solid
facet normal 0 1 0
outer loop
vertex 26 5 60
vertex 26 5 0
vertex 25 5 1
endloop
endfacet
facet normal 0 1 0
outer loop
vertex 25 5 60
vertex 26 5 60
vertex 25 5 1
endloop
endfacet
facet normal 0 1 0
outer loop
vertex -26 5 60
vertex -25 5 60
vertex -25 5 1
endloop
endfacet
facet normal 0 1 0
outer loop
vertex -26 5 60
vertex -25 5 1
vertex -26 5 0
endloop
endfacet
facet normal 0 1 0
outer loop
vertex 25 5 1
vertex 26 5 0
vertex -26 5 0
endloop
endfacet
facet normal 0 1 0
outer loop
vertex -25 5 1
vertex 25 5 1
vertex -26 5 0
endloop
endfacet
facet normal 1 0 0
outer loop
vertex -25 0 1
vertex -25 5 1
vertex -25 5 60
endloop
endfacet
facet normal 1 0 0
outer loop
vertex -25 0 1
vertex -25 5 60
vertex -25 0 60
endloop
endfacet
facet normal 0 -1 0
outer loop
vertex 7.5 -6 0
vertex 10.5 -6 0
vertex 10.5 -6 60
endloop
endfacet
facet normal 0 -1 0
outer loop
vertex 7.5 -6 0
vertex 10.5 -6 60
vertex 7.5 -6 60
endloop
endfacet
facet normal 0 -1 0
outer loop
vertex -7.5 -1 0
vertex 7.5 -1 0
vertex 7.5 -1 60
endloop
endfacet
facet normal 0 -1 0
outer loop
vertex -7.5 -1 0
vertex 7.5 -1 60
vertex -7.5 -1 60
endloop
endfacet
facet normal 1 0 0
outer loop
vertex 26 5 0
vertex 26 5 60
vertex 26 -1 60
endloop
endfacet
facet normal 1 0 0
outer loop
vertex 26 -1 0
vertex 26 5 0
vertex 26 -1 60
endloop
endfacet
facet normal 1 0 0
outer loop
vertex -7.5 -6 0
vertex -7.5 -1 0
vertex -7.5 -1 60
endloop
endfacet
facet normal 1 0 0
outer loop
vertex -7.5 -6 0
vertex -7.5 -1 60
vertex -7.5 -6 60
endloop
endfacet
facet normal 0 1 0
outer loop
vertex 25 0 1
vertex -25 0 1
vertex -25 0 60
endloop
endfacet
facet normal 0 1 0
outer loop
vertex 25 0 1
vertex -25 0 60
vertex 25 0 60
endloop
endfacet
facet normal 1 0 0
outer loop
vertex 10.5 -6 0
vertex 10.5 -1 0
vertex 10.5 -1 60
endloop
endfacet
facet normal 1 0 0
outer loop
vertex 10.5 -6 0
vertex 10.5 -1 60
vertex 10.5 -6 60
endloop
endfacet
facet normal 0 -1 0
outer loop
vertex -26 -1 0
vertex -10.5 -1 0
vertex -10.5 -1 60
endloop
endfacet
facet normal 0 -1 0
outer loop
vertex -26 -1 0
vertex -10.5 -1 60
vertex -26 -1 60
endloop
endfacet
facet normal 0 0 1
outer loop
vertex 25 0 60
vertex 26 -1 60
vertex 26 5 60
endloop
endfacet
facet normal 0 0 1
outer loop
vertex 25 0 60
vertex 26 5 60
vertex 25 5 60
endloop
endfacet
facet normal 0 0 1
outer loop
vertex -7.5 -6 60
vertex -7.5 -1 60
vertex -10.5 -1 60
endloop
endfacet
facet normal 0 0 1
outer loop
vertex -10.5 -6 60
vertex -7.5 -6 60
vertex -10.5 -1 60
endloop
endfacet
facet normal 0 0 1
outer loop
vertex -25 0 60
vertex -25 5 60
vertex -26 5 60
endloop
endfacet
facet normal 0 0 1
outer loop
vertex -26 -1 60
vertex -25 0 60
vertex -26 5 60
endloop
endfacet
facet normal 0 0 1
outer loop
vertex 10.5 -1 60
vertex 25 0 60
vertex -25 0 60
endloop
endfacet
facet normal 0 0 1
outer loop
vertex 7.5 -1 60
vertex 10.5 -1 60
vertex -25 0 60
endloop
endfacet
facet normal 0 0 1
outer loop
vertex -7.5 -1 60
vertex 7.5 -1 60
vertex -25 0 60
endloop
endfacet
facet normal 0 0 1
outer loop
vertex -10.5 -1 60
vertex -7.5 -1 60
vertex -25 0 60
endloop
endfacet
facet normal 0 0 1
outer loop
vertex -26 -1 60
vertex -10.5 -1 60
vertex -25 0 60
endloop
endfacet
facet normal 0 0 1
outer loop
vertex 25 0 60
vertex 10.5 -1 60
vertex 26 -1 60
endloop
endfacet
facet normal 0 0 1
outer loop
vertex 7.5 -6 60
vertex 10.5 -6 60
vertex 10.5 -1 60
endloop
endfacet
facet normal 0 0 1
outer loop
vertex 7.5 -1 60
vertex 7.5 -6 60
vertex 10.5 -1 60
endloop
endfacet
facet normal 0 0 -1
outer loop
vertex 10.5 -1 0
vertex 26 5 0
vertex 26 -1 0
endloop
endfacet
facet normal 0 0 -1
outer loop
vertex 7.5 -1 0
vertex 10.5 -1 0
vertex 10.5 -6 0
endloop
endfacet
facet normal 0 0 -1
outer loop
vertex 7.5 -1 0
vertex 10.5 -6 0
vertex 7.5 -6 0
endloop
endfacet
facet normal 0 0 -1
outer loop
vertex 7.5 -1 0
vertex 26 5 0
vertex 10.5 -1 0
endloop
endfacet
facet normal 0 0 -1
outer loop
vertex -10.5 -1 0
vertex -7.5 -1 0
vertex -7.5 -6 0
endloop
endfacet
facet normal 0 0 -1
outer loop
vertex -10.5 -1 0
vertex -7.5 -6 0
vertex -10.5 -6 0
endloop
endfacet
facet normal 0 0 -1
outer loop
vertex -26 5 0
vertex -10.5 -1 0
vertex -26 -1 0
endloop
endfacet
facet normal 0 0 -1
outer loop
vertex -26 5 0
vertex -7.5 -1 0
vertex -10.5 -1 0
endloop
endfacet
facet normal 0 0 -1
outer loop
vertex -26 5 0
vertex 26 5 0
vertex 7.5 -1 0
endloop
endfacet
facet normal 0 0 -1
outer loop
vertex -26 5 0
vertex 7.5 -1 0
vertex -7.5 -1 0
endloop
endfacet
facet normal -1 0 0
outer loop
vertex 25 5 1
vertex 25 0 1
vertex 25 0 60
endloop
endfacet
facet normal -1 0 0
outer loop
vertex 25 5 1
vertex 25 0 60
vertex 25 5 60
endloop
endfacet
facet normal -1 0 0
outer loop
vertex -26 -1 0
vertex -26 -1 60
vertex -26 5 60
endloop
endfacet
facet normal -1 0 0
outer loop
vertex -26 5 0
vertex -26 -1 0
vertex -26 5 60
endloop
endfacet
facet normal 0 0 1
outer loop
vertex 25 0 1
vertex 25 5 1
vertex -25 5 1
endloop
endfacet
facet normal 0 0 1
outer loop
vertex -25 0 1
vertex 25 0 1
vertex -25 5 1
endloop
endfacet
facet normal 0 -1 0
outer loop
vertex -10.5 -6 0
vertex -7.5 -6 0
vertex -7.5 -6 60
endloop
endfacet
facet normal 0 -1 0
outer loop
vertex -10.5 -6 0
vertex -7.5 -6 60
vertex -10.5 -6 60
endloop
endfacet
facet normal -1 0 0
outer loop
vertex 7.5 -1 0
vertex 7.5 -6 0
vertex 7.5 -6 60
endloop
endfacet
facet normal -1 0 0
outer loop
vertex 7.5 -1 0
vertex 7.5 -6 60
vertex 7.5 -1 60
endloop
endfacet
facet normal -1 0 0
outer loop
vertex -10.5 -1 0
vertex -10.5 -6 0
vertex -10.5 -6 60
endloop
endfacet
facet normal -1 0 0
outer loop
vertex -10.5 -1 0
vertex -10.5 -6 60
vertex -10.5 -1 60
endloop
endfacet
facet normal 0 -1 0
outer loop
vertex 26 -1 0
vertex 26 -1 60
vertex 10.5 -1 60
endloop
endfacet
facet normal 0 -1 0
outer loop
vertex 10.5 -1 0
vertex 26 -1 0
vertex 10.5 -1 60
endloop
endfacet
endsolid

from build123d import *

# Parameters (mm, degrees)
BOSS_EXTRUDE1_DEPTH = 60
SKETCH2_W           = 50
SKETCH2_H           = 5
BOSS_EXTRUDE2_DEPTH = 1


with BuildPart() as part:
    # Sketch1 → Boss-Extrude1 (new body)
    with BuildSketch(Plane.XY):
        Polygon((-25, 0), (25, 0), (25, 5), (26, 5), (26, -1), (10.5, -1), (10.5, -6), (7.5, -6), (7.5, -1), (-7.5, -1), (-7.5, -6), (-10.5, -6), (-10.5, -1), (-26, -1), (-26, 5), (-25, 5), align=None)
    extrude(amount=BOSS_EXTRUDE1_DEPTH)

    # Sketch2 → Boss-Extrude2 (add)
    with BuildSketch(Plane(origin=(0, 0, 0), x_dir=(-1, 0, 0), z_dir=(0, 0, -1))):
        with Locations((0, 2.5)):
            Rectangle(SKETCH2_W, SKETCH2_H)
    extrude(amount=-BOSS_EXTRUDE2_DEPTH)


solid = part.part
